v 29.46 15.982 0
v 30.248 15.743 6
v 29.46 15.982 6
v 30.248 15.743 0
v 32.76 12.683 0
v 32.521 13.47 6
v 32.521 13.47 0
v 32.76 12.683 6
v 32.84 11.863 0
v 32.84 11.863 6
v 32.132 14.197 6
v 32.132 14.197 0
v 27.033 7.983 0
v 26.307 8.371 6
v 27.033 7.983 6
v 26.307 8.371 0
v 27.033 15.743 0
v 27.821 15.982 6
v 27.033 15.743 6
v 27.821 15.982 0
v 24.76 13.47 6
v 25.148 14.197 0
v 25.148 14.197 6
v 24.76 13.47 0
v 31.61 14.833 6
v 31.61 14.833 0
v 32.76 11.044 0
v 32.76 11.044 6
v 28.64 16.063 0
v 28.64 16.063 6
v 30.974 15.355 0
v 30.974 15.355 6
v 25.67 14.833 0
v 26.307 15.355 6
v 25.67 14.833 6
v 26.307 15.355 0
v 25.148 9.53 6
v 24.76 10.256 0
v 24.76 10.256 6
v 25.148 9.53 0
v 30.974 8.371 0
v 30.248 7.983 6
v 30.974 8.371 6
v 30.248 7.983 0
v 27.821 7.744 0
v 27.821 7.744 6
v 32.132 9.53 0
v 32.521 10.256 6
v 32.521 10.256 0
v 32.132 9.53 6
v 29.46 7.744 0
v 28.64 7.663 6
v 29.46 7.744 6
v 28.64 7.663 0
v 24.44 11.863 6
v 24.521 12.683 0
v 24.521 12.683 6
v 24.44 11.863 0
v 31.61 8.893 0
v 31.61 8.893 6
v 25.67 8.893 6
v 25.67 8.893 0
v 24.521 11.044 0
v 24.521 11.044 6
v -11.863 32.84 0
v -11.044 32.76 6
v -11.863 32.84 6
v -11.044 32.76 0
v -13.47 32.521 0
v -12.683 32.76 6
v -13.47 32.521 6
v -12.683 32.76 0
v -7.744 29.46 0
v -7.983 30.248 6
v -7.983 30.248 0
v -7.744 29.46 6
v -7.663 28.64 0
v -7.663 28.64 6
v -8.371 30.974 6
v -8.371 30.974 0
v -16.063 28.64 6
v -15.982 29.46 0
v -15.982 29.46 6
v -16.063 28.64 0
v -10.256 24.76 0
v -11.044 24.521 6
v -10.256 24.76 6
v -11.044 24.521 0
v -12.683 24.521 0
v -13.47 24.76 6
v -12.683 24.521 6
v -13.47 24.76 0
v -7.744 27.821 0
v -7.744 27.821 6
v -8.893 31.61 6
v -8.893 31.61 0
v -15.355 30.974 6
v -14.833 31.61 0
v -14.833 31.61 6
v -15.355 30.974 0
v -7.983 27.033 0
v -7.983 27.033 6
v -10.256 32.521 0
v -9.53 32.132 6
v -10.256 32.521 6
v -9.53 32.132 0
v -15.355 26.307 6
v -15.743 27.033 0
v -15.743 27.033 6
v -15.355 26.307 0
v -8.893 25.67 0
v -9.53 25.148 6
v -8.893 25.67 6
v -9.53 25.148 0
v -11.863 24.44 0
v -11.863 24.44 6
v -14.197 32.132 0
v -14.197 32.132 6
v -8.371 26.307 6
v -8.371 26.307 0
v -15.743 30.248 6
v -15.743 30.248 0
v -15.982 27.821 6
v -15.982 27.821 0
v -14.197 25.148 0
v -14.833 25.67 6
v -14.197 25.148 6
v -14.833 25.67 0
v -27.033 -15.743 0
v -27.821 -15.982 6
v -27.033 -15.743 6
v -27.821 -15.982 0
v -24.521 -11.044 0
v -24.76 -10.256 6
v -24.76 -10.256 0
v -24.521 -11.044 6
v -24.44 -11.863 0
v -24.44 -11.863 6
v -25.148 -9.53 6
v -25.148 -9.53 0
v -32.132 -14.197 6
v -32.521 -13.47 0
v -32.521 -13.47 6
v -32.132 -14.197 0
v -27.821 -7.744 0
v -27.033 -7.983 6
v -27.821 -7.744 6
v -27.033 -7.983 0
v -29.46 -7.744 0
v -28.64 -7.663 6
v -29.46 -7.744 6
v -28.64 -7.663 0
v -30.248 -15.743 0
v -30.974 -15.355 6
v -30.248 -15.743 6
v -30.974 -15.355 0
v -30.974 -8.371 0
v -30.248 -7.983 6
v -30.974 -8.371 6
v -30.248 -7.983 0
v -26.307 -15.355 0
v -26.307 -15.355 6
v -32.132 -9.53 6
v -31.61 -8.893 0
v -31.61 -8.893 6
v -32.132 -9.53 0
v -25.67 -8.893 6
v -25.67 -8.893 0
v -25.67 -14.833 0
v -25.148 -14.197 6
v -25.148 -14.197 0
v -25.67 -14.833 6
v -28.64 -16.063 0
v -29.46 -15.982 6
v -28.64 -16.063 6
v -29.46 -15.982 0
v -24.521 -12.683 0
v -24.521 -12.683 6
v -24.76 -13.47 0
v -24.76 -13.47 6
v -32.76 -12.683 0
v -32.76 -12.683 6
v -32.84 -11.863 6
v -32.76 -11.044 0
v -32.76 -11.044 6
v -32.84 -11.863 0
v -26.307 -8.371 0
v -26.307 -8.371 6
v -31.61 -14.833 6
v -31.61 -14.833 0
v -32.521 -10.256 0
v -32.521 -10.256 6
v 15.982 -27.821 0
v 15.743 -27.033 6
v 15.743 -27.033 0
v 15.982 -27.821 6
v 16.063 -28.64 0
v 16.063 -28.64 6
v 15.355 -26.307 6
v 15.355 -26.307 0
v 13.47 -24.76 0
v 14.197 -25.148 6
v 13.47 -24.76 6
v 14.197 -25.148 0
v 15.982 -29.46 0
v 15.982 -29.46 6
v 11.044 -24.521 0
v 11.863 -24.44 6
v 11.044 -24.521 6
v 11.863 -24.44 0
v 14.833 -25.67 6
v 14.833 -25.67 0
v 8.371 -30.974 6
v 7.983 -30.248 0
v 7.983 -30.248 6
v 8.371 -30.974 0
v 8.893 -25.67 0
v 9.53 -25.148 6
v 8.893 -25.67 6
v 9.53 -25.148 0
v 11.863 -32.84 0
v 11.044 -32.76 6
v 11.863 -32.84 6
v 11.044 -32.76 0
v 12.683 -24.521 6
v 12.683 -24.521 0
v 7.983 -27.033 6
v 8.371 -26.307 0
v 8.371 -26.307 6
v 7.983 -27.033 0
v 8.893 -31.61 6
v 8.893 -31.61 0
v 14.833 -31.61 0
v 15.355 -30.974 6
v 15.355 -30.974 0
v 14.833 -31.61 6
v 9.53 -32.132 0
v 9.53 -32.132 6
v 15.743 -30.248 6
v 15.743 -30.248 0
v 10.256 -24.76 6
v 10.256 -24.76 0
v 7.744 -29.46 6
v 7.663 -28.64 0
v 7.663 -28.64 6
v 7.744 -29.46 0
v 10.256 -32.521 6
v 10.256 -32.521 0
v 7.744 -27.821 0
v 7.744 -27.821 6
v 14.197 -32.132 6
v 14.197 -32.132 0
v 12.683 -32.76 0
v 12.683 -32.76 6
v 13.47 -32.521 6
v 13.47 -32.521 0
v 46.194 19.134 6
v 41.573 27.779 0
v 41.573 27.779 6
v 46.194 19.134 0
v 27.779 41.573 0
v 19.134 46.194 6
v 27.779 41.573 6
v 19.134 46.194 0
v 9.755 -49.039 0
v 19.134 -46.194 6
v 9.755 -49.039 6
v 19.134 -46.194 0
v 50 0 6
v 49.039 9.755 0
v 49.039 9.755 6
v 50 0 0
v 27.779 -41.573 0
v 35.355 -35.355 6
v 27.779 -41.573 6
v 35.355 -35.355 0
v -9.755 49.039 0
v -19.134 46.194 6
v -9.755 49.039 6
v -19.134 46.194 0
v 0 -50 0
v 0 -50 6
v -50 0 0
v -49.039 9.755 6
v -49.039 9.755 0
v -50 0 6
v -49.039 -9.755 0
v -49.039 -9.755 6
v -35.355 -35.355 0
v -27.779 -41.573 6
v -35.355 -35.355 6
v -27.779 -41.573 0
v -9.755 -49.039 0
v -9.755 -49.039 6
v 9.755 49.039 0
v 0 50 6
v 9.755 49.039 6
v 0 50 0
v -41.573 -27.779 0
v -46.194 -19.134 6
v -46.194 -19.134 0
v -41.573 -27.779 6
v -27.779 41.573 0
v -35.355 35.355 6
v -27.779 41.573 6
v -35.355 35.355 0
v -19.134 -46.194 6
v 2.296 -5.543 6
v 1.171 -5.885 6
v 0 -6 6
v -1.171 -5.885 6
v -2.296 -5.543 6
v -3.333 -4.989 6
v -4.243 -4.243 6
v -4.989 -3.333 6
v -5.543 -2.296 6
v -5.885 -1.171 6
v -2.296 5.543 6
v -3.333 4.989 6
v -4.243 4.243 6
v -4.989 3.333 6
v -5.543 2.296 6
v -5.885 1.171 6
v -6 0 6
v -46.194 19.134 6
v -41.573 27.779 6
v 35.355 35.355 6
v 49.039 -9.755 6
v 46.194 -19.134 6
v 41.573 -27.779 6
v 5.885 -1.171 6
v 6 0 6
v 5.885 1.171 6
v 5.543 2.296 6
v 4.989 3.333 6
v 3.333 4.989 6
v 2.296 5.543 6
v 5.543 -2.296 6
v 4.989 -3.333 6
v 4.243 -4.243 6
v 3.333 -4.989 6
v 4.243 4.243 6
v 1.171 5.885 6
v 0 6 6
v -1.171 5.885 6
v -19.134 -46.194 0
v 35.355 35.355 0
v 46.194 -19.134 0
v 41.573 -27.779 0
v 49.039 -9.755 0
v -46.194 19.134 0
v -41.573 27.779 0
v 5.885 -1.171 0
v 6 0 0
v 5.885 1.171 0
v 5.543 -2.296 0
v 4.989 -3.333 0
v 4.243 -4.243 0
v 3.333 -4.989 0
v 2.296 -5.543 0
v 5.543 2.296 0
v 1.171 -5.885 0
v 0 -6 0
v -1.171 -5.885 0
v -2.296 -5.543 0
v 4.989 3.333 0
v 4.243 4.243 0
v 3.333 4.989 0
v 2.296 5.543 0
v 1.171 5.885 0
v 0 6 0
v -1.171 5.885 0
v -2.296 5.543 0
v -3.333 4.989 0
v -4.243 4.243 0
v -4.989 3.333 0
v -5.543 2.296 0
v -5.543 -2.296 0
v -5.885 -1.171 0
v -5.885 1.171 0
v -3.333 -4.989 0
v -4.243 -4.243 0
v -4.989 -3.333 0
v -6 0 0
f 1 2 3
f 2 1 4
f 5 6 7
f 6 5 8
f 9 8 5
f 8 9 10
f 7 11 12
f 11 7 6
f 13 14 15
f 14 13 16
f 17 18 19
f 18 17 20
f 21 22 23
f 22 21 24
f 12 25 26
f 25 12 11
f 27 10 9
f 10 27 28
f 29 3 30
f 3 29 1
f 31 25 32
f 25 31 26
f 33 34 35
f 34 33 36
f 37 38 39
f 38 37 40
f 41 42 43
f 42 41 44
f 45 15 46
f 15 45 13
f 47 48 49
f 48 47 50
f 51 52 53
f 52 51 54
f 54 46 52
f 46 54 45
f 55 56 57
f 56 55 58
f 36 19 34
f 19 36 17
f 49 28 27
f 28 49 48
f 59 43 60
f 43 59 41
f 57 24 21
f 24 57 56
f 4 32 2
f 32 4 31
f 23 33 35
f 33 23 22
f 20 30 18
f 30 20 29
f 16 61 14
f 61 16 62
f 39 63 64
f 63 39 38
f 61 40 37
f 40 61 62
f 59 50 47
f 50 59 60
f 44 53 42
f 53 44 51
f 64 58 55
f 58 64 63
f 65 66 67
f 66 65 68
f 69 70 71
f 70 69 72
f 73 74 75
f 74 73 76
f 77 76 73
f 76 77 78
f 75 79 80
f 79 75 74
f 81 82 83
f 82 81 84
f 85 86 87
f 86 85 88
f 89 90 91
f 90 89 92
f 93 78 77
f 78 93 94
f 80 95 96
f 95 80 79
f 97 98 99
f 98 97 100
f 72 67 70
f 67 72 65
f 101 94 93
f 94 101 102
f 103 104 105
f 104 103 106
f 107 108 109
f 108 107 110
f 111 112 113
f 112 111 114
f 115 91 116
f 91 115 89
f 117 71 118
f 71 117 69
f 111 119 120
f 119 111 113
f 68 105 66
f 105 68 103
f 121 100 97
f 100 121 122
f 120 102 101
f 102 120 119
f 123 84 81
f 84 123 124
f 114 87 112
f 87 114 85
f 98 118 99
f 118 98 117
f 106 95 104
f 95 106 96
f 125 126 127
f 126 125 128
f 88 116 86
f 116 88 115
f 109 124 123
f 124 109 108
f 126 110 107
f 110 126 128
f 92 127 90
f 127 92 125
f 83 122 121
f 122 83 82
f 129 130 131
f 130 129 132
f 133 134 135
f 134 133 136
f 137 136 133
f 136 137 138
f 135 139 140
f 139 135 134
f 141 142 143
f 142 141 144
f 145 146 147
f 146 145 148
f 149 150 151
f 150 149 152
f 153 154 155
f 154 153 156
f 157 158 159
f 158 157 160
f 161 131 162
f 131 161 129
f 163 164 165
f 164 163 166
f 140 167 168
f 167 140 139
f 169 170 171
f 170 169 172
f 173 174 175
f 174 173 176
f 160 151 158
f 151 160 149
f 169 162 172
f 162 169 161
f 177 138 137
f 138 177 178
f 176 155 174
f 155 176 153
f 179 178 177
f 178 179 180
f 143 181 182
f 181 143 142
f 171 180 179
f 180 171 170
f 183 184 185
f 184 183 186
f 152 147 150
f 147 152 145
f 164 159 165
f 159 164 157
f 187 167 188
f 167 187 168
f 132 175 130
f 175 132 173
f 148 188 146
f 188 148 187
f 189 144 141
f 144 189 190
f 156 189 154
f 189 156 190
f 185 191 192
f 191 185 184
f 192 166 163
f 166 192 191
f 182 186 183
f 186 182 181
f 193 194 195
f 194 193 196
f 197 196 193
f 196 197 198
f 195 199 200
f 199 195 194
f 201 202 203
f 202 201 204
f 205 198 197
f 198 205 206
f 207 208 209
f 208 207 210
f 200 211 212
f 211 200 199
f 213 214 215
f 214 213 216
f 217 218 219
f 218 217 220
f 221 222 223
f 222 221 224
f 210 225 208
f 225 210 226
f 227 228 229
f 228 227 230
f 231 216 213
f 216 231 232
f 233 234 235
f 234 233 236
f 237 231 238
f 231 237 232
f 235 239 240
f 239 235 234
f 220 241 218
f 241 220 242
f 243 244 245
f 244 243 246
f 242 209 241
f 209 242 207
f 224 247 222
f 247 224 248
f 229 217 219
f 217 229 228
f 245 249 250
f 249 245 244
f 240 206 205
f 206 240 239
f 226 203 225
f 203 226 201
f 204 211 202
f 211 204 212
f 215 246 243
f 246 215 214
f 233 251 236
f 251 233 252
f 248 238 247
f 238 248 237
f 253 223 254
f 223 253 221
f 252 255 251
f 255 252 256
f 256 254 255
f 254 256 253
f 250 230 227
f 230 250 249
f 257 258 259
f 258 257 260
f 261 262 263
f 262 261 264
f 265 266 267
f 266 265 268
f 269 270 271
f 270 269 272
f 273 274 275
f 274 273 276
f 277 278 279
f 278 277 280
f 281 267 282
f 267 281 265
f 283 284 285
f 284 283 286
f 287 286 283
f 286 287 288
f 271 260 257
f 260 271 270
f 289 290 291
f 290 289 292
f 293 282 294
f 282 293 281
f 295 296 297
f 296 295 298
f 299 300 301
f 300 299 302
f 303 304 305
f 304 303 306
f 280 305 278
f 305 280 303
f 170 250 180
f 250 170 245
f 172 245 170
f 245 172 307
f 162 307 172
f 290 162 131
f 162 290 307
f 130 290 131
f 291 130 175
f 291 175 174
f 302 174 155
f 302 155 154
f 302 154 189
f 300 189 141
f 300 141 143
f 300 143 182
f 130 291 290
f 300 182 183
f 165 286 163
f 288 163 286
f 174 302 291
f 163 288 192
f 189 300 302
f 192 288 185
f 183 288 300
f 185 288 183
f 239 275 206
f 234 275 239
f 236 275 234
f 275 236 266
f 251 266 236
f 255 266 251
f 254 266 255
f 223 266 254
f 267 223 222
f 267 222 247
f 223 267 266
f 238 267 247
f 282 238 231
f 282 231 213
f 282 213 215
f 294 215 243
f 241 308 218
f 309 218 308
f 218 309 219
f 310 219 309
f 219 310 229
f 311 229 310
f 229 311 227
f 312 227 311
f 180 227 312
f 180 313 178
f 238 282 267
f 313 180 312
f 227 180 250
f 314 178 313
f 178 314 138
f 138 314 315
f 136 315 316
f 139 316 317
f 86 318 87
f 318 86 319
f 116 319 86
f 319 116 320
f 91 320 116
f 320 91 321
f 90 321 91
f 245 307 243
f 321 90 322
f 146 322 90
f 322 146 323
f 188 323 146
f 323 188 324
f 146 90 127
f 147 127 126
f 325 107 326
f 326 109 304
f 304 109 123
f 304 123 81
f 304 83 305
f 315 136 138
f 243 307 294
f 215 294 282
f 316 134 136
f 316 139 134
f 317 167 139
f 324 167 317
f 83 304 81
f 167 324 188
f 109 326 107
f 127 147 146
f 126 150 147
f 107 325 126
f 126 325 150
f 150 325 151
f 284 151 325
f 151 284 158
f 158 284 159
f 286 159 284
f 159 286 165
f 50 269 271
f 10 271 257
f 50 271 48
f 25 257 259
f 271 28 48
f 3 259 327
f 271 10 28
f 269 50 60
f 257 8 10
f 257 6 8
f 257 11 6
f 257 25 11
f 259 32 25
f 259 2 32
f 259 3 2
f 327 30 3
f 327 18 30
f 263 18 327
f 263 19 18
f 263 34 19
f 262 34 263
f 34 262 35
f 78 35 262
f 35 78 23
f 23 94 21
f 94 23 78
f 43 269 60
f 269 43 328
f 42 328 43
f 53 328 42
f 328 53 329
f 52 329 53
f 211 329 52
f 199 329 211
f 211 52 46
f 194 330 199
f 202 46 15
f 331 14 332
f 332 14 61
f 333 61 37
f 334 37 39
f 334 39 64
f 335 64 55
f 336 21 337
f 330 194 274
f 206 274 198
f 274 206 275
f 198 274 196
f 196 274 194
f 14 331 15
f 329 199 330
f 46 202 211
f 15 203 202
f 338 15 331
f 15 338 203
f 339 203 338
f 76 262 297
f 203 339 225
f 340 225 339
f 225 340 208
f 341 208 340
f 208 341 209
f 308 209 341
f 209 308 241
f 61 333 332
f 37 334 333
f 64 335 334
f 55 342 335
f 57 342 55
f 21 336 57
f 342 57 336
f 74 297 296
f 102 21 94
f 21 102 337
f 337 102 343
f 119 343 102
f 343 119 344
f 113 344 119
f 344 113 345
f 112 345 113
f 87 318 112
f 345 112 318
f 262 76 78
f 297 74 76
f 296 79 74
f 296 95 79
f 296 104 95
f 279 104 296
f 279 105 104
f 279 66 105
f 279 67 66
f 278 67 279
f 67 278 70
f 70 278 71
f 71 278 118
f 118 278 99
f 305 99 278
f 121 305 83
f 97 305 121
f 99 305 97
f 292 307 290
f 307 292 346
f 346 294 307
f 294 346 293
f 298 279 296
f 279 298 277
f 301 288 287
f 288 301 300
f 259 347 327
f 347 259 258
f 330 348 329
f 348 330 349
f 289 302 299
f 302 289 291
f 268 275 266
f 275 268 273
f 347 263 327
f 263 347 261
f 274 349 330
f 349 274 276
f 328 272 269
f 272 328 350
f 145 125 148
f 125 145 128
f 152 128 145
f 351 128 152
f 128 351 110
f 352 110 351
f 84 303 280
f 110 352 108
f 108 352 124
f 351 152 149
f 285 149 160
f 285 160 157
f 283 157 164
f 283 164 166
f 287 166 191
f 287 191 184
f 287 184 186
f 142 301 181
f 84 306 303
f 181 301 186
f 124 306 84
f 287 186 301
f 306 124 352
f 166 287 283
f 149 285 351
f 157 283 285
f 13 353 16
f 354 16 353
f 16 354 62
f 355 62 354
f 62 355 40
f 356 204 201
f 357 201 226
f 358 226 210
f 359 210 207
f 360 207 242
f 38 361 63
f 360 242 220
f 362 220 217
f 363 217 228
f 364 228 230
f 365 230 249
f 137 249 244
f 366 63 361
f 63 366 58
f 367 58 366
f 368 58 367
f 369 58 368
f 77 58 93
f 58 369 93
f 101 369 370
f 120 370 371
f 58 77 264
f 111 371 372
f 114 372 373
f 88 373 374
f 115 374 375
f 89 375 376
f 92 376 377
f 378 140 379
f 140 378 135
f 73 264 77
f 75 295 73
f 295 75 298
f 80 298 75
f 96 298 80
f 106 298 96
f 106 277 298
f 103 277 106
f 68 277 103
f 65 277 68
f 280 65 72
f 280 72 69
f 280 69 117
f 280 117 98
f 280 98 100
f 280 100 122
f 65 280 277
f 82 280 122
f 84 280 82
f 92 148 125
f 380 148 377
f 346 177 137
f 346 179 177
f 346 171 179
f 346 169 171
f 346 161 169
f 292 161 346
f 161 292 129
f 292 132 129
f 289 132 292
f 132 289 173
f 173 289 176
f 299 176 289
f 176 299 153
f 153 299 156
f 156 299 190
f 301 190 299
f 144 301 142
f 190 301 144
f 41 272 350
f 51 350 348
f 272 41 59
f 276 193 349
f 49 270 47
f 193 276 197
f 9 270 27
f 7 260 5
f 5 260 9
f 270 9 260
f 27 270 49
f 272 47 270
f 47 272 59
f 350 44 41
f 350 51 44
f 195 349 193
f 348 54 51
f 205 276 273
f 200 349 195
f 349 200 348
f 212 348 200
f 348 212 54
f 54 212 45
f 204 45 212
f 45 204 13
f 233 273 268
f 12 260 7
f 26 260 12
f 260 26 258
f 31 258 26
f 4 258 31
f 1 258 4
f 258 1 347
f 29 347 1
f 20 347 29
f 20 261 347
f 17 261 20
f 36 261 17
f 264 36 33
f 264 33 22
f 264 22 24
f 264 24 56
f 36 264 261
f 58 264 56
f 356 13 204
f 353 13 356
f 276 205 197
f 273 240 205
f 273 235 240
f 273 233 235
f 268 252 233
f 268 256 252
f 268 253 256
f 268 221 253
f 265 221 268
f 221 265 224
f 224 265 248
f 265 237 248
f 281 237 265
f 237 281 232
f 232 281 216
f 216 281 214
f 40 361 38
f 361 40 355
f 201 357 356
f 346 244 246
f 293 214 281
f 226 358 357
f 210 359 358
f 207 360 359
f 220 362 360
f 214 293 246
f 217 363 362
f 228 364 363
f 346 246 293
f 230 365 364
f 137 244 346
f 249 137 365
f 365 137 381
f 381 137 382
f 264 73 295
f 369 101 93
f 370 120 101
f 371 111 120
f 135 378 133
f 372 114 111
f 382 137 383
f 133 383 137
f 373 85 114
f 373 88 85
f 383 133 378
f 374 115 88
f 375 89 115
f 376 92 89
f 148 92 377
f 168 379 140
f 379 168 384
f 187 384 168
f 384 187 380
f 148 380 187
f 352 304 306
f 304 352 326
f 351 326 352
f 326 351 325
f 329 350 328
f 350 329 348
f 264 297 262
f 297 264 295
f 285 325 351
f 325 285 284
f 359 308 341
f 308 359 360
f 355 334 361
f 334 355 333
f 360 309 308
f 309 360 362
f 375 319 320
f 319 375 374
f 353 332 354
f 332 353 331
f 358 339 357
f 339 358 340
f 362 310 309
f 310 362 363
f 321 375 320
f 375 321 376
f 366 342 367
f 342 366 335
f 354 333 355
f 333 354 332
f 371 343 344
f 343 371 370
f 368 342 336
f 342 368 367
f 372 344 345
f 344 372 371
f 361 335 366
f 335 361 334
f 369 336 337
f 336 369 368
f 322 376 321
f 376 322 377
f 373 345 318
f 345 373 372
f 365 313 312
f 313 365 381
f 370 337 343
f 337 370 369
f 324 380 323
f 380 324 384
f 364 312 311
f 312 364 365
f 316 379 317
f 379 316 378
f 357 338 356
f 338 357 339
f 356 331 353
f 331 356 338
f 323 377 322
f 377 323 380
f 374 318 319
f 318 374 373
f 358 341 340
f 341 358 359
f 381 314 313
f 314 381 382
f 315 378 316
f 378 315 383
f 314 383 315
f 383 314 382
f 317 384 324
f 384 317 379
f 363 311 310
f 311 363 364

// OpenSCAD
$fn = 32;

// ----------------------------------------------------------------------
// Flange Ø100 x 6
// 4 holes on a Ø62 bolt circle, bolted joints
// ----------------------------------------------------------------------

// --- parameters (mm) ---
flange_d = 100;    // outside diameter of the flange
thickness = 6;     // flange thickness
holes = 4;         // number of bolt holes
pcd = 62;          // bolt circle diameter
start_deg = 22.5;  // angle of the first hole, from +X
hole_d = 8.4;      // bolt hole diameter
bore_d = 12;       // central through bore
hub_d = 24;        // hub outside diameter
hub_h = 0;         // hub height above the flange face (0 = no hub)

// --- derived feature positions (mm) ---
height = thickness + hub_h;  // = 6   overall height of the part
pcd_r = pcd / 2;             // = 31   bolt circle radius
hole_step = 360 / holes;     // = 90   angular pitch
feature_centers = [
  [pcd_r * cos(start_deg + 0 * hole_step), pcd_r * sin(start_deg + 0 * hole_step)],
  [pcd_r * cos(start_deg + 1 * hole_step), pcd_r * sin(start_deg + 1 * hole_step)],
  [pcd_r * cos(start_deg + 2 * hole_step), pcd_r * sin(start_deg + 2 * hole_step)],
  [pcd_r * cos(start_deg + 3 * hole_step), pcd_r * sin(start_deg + 3 * hole_step)]
];   // bolt hole centres on the pitch circle

// flange disc, every hole and the bore cut straight through
difference() {
  union() {
    cylinder(d = flange_d, h = thickness);
  }
  translate([0, 0, -1]) cylinder(d = bore_d, h = height + 2);  // bore, through
  for (centre = feature_centers)
    translate([centre[0], centre[1], -1]) cylinder(d = hole_d, h = thickness + 2);
}
